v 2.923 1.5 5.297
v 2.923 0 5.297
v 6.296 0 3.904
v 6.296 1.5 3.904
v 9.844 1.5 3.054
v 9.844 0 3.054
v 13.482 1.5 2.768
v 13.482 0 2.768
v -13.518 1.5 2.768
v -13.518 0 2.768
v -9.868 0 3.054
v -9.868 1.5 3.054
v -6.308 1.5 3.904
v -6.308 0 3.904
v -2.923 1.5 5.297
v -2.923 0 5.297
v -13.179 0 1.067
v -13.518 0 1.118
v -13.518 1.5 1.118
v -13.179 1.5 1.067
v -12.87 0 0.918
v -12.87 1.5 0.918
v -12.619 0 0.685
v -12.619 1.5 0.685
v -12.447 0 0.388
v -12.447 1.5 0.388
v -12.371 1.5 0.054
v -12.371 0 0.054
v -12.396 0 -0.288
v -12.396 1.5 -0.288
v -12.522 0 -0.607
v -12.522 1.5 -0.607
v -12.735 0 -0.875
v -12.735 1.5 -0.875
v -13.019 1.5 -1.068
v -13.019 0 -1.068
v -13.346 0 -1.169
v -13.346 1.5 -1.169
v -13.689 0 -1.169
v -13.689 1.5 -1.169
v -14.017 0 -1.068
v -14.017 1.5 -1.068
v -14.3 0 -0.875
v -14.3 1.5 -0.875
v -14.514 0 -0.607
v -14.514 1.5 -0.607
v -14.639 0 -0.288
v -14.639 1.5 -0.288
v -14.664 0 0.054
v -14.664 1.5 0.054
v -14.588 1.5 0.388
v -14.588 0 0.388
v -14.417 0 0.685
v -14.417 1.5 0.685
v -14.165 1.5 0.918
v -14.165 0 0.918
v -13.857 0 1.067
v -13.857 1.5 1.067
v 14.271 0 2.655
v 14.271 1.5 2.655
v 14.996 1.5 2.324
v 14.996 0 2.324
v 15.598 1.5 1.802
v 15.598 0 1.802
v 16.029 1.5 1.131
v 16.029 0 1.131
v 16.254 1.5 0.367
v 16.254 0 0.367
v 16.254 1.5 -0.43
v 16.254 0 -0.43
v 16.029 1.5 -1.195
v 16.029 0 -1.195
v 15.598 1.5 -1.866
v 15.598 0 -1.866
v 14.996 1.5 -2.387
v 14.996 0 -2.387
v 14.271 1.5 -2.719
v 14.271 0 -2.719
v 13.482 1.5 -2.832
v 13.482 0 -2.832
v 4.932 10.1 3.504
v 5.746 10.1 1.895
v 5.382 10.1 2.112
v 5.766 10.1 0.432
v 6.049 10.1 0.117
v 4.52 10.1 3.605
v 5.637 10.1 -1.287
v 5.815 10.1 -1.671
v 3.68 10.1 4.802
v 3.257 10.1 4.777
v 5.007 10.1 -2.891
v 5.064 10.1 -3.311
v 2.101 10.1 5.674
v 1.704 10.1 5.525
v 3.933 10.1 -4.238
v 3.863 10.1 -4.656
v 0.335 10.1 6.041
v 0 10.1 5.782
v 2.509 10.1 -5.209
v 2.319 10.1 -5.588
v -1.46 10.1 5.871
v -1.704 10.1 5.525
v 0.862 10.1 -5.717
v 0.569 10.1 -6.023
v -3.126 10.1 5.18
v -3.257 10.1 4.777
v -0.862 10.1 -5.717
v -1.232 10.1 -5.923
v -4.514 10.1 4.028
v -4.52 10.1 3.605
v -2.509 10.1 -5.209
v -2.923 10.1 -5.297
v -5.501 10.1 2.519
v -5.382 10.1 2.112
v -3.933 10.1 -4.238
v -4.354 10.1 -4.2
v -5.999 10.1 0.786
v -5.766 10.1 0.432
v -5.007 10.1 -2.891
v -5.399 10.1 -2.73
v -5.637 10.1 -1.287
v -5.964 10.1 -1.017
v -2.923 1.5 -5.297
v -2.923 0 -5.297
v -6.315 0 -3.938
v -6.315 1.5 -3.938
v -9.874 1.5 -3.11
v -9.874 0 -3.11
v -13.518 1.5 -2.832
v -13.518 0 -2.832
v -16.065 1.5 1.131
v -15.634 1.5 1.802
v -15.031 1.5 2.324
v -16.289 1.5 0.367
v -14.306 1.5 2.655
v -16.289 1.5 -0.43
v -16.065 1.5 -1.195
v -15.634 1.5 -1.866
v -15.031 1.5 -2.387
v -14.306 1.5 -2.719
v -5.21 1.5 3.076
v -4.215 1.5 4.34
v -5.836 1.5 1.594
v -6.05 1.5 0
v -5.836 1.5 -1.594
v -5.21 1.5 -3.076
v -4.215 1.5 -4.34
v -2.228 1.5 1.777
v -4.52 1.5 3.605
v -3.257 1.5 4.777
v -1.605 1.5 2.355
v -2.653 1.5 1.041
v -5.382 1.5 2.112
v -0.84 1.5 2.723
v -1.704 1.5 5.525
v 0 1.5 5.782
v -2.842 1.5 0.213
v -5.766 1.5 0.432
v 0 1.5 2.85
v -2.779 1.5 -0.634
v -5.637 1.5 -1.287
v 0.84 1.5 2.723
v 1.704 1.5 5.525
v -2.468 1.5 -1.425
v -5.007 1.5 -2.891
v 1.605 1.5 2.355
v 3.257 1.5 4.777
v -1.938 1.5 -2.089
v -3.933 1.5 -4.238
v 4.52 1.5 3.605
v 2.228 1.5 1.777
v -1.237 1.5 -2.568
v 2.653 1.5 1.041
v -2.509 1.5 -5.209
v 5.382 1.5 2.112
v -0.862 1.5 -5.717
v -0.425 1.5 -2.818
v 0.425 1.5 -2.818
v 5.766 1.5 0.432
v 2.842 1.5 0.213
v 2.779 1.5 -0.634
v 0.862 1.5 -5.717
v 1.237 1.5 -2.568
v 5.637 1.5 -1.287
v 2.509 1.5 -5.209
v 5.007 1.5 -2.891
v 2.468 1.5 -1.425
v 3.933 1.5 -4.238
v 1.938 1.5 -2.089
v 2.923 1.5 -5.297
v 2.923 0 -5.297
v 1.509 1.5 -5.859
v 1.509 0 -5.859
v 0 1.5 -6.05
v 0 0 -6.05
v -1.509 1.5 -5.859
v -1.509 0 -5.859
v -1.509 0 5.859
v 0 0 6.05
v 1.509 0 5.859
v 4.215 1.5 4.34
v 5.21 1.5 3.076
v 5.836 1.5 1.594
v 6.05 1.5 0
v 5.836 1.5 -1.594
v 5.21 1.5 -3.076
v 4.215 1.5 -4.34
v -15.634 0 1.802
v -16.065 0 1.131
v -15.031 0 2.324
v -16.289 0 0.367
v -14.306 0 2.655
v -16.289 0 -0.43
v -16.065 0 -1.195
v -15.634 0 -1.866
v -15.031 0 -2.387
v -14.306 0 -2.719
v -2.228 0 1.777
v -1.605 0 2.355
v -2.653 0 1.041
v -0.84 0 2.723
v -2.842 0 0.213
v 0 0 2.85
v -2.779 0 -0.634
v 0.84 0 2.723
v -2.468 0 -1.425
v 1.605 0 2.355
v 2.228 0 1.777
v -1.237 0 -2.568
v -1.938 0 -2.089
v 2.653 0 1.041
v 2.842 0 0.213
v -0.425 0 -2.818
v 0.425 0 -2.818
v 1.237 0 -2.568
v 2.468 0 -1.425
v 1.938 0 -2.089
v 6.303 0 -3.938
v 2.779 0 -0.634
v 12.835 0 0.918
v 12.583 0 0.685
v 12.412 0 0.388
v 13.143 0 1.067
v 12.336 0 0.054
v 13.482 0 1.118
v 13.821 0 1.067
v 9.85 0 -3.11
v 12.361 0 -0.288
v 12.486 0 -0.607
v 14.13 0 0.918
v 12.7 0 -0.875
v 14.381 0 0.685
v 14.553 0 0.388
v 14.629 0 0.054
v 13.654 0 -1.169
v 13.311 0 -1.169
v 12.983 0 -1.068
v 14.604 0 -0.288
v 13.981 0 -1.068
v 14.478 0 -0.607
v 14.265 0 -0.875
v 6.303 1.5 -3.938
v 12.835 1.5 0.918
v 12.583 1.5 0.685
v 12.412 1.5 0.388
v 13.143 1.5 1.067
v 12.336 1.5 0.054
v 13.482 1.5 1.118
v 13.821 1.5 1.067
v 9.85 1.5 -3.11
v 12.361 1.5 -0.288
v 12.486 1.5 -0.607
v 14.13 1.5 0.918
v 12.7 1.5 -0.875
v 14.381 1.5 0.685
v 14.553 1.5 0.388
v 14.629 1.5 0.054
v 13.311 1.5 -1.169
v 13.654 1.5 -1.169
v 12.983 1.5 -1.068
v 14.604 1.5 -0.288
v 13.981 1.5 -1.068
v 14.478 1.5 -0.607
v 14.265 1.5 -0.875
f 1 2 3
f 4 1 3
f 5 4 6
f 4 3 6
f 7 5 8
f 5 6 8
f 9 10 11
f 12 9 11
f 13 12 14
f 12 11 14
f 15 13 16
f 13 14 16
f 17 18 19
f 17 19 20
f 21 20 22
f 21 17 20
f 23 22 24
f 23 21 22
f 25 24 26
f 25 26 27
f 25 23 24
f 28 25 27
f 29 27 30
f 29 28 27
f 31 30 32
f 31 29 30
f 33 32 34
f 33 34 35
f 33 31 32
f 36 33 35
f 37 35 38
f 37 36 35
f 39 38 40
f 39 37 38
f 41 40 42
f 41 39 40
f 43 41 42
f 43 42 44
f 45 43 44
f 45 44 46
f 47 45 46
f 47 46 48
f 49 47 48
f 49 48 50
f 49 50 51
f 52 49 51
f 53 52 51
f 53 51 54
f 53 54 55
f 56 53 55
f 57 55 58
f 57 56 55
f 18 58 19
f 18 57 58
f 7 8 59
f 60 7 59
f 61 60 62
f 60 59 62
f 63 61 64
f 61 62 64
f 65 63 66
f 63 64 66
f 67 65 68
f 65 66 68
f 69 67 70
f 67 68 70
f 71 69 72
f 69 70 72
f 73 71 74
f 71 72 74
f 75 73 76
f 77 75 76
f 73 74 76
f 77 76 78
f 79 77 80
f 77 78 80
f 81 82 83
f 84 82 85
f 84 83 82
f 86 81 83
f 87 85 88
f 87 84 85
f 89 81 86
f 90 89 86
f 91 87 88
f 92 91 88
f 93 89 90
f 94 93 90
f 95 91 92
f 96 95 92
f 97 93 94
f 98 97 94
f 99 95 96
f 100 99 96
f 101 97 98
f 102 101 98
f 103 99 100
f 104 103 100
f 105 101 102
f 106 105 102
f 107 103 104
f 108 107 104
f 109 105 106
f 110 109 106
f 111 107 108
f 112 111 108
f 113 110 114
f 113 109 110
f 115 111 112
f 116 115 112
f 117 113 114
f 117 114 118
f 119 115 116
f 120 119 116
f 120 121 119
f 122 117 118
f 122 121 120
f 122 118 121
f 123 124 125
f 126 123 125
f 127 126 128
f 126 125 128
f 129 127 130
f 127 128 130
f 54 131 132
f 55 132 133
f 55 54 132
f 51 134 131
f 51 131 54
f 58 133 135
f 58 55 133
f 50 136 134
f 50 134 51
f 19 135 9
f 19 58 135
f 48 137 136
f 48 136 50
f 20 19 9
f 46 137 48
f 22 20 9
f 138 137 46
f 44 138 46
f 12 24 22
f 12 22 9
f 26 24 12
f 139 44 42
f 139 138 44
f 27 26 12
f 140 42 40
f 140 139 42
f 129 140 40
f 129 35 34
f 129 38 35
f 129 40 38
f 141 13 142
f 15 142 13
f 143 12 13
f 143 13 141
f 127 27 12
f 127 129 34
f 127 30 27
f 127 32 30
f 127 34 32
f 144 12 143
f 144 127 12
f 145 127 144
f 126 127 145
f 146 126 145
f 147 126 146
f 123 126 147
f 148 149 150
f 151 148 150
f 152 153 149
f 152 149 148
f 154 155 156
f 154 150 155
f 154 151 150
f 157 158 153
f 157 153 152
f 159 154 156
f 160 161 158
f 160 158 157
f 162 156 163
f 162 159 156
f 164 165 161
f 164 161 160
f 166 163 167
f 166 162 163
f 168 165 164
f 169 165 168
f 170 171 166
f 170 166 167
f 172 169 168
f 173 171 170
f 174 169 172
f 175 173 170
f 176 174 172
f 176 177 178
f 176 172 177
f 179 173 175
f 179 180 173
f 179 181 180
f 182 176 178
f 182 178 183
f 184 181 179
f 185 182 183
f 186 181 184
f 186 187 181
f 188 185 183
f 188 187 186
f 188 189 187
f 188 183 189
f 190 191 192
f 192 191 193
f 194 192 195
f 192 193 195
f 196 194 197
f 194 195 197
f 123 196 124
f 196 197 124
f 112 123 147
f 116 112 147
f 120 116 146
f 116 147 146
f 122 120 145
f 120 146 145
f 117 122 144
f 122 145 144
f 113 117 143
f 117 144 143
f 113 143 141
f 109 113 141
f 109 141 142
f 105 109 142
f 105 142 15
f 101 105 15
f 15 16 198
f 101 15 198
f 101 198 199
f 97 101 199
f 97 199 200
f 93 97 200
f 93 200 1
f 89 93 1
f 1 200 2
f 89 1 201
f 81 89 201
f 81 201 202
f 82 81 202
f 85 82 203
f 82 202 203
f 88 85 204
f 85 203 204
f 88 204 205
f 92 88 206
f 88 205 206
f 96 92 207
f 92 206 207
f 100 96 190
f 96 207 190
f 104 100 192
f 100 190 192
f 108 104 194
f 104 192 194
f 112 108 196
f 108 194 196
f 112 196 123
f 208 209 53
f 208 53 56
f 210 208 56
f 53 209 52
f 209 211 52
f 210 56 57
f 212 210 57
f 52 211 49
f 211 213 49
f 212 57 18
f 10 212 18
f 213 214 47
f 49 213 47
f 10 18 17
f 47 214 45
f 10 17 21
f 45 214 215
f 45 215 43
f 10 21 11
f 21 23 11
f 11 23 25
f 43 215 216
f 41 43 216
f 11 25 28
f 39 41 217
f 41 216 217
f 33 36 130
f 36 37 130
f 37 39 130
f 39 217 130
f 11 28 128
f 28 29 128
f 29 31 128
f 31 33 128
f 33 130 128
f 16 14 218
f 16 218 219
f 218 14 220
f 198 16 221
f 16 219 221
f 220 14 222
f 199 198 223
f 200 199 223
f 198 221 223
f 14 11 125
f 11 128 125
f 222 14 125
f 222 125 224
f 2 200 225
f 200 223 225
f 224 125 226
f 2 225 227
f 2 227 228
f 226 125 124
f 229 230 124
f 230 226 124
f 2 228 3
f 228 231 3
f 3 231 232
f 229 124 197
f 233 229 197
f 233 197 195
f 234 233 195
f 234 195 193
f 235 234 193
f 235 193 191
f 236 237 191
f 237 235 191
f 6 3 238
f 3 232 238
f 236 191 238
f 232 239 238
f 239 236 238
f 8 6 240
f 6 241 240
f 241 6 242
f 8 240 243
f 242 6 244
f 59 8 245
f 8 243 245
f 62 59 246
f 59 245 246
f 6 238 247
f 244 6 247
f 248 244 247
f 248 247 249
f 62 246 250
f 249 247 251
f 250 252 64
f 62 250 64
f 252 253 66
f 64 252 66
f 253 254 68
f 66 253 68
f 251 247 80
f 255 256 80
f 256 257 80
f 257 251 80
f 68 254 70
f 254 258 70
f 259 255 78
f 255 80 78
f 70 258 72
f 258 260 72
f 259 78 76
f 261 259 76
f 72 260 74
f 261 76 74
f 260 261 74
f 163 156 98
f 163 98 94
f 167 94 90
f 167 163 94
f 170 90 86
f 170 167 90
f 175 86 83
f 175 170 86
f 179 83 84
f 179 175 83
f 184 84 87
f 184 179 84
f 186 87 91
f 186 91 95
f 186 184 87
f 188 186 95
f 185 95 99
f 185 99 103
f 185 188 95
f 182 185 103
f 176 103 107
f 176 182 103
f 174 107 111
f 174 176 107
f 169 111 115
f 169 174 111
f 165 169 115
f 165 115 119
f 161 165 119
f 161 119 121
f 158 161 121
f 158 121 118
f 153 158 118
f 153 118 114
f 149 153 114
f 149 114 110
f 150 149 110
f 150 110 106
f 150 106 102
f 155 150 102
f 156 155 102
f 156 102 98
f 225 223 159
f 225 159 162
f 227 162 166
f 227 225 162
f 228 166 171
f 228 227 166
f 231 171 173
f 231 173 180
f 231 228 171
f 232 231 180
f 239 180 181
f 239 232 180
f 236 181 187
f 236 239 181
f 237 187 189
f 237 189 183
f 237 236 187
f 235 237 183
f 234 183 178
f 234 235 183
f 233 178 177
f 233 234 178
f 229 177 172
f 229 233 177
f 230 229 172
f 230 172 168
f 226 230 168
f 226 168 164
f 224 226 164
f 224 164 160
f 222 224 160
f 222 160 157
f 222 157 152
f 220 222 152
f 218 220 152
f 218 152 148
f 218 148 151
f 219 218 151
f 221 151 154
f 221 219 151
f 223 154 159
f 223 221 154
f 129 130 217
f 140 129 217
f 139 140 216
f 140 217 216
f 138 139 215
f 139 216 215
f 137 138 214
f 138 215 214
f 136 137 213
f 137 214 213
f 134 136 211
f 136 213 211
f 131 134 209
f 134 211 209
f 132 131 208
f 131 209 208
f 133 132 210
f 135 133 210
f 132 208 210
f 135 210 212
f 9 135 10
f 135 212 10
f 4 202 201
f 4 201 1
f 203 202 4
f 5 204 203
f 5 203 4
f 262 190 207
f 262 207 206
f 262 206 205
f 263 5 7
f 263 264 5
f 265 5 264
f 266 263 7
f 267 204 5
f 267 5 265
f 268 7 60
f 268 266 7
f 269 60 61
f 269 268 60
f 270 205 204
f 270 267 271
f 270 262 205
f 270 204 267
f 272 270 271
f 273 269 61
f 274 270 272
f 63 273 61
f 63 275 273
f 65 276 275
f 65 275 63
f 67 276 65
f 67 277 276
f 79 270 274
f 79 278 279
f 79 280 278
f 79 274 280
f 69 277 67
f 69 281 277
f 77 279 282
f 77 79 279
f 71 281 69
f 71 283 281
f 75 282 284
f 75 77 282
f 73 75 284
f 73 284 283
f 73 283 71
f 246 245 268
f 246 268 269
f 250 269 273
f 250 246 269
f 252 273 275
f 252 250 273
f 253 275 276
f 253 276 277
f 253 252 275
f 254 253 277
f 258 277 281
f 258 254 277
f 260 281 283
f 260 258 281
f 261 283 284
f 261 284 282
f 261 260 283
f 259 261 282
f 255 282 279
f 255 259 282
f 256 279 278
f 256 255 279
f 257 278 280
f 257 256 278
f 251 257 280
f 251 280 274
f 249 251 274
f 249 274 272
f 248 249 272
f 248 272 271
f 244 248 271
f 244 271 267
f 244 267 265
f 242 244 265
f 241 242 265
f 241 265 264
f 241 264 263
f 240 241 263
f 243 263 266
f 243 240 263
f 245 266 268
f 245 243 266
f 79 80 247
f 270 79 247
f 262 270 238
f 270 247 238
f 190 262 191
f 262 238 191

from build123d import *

# Parameters (mm, degrees)
SKETCH1_R           = 1.15
SKETCH1_R_2         = 6.05
SKETCH1_R_3         = 2.85
BOSS_EXTRUDE1_DEPTH = 1.5
SKETCH3_R           = 6.05
SKETCH3_R_2         = 5.781920351
BOSS_EXTRUDE6_DEPTH = 10.1


with BuildPart() as part:
    # Sketch1 → Boss-Extrude1 (new body)
    # profile 1 of 3: a face of its own
    with BuildSketch(Plane(origin=(0, 0, 0), x_dir=(1, 0, 0), z_dir=(0, 1, 0))):
        with BuildLine():
            ThreePointArc((-13.51764198, -2.768029891), (-8.071510009, -3.409034399), (-2.923037011, -5.297013747))
            ThreePointArc((-2.923037011, -5.297013747), (-6.05, 0), (-2.923037011, 5.297013747))
            ThreePointArc((-2.923037011, 5.297013747), (-8.078843984, 3.456352976), (-13.51764198, 2.831970109))
            ThreePointArc((-13.51764198, 2.831970109), (-16.31764198, 0.031970109), (-13.51764198, -2.768029891))
        make_face()
        with Locations(Location((-13.51764198, 0.031970109, 0), (0, 0, 270))):
            Circle(SKETCH1_R, mode=Mode.SUBTRACT)
    # profile 2 of 3: a face of its own
    with BuildSketch(Plane(origin=(0, 0, 0), x_dir=(1, 0, 0), z_dir=(0, 1, 0))):
        Circle(SKETCH1_R_2)
        with Locations(Location((0, 0, 0), (0, 0, 270))):
            Circle(SKETCH1_R_3, mode=Mode.SUBTRACT)
    # profile 3 of 3: a face of its own
    with BuildSketch(Plane(origin=(0, 0, 0), x_dir=(1, 0, 0), z_dir=(0, 1, 0))):
        with BuildLine():
            ThreePointArc((2.923037011, -5.297013747), (8.053384371, -3.409091417), (13.48235802, -2.768029891))
            ThreePointArc((13.48235802, -2.768029891), (16.28235802, 0.031970109), (13.48235802, 2.831970109))
            ThreePointArc((13.48235802, 2.831970109), (8.060741556, 3.456405922), (2.923037011, 5.297013747))
            ThreePointArc((2.923037011, 5.297013747), (5.209936368, 3.07555898), (6.05, 0))
            ThreePointArc((6.05, 0), (5.209936368, -3.07555898), (2.923037011, -5.297013747))
        make_face()
        with Locations(Location((13.48235802, 0.031970109, 0), (0, 0, 270))):
            Circle(SKETCH1_R, mode=Mode.SUBTRACT)
    extrude(amount=BOSS_EXTRUDE1_DEPTH)

    # Sketch3 → Boss-Extrude6 (add)
    with BuildSketch(Plane(origin=(0, 0, 0), x_dir=(1, 0, 0), z_dir=(0, 1, 0))):
        with Locations(Location((0, 0, 0), (0, 0, 118.891114763))):
            Circle(SKETCH3_R)
        with Locations(Location((0, 0, 0), (0, 0, 270))):
            Circle(SKETCH3_R_2, mode=Mode.SUBTRACT)
    extrude(amount=BOSS_EXTRUDE6_DEPTH)


solid = part.part
